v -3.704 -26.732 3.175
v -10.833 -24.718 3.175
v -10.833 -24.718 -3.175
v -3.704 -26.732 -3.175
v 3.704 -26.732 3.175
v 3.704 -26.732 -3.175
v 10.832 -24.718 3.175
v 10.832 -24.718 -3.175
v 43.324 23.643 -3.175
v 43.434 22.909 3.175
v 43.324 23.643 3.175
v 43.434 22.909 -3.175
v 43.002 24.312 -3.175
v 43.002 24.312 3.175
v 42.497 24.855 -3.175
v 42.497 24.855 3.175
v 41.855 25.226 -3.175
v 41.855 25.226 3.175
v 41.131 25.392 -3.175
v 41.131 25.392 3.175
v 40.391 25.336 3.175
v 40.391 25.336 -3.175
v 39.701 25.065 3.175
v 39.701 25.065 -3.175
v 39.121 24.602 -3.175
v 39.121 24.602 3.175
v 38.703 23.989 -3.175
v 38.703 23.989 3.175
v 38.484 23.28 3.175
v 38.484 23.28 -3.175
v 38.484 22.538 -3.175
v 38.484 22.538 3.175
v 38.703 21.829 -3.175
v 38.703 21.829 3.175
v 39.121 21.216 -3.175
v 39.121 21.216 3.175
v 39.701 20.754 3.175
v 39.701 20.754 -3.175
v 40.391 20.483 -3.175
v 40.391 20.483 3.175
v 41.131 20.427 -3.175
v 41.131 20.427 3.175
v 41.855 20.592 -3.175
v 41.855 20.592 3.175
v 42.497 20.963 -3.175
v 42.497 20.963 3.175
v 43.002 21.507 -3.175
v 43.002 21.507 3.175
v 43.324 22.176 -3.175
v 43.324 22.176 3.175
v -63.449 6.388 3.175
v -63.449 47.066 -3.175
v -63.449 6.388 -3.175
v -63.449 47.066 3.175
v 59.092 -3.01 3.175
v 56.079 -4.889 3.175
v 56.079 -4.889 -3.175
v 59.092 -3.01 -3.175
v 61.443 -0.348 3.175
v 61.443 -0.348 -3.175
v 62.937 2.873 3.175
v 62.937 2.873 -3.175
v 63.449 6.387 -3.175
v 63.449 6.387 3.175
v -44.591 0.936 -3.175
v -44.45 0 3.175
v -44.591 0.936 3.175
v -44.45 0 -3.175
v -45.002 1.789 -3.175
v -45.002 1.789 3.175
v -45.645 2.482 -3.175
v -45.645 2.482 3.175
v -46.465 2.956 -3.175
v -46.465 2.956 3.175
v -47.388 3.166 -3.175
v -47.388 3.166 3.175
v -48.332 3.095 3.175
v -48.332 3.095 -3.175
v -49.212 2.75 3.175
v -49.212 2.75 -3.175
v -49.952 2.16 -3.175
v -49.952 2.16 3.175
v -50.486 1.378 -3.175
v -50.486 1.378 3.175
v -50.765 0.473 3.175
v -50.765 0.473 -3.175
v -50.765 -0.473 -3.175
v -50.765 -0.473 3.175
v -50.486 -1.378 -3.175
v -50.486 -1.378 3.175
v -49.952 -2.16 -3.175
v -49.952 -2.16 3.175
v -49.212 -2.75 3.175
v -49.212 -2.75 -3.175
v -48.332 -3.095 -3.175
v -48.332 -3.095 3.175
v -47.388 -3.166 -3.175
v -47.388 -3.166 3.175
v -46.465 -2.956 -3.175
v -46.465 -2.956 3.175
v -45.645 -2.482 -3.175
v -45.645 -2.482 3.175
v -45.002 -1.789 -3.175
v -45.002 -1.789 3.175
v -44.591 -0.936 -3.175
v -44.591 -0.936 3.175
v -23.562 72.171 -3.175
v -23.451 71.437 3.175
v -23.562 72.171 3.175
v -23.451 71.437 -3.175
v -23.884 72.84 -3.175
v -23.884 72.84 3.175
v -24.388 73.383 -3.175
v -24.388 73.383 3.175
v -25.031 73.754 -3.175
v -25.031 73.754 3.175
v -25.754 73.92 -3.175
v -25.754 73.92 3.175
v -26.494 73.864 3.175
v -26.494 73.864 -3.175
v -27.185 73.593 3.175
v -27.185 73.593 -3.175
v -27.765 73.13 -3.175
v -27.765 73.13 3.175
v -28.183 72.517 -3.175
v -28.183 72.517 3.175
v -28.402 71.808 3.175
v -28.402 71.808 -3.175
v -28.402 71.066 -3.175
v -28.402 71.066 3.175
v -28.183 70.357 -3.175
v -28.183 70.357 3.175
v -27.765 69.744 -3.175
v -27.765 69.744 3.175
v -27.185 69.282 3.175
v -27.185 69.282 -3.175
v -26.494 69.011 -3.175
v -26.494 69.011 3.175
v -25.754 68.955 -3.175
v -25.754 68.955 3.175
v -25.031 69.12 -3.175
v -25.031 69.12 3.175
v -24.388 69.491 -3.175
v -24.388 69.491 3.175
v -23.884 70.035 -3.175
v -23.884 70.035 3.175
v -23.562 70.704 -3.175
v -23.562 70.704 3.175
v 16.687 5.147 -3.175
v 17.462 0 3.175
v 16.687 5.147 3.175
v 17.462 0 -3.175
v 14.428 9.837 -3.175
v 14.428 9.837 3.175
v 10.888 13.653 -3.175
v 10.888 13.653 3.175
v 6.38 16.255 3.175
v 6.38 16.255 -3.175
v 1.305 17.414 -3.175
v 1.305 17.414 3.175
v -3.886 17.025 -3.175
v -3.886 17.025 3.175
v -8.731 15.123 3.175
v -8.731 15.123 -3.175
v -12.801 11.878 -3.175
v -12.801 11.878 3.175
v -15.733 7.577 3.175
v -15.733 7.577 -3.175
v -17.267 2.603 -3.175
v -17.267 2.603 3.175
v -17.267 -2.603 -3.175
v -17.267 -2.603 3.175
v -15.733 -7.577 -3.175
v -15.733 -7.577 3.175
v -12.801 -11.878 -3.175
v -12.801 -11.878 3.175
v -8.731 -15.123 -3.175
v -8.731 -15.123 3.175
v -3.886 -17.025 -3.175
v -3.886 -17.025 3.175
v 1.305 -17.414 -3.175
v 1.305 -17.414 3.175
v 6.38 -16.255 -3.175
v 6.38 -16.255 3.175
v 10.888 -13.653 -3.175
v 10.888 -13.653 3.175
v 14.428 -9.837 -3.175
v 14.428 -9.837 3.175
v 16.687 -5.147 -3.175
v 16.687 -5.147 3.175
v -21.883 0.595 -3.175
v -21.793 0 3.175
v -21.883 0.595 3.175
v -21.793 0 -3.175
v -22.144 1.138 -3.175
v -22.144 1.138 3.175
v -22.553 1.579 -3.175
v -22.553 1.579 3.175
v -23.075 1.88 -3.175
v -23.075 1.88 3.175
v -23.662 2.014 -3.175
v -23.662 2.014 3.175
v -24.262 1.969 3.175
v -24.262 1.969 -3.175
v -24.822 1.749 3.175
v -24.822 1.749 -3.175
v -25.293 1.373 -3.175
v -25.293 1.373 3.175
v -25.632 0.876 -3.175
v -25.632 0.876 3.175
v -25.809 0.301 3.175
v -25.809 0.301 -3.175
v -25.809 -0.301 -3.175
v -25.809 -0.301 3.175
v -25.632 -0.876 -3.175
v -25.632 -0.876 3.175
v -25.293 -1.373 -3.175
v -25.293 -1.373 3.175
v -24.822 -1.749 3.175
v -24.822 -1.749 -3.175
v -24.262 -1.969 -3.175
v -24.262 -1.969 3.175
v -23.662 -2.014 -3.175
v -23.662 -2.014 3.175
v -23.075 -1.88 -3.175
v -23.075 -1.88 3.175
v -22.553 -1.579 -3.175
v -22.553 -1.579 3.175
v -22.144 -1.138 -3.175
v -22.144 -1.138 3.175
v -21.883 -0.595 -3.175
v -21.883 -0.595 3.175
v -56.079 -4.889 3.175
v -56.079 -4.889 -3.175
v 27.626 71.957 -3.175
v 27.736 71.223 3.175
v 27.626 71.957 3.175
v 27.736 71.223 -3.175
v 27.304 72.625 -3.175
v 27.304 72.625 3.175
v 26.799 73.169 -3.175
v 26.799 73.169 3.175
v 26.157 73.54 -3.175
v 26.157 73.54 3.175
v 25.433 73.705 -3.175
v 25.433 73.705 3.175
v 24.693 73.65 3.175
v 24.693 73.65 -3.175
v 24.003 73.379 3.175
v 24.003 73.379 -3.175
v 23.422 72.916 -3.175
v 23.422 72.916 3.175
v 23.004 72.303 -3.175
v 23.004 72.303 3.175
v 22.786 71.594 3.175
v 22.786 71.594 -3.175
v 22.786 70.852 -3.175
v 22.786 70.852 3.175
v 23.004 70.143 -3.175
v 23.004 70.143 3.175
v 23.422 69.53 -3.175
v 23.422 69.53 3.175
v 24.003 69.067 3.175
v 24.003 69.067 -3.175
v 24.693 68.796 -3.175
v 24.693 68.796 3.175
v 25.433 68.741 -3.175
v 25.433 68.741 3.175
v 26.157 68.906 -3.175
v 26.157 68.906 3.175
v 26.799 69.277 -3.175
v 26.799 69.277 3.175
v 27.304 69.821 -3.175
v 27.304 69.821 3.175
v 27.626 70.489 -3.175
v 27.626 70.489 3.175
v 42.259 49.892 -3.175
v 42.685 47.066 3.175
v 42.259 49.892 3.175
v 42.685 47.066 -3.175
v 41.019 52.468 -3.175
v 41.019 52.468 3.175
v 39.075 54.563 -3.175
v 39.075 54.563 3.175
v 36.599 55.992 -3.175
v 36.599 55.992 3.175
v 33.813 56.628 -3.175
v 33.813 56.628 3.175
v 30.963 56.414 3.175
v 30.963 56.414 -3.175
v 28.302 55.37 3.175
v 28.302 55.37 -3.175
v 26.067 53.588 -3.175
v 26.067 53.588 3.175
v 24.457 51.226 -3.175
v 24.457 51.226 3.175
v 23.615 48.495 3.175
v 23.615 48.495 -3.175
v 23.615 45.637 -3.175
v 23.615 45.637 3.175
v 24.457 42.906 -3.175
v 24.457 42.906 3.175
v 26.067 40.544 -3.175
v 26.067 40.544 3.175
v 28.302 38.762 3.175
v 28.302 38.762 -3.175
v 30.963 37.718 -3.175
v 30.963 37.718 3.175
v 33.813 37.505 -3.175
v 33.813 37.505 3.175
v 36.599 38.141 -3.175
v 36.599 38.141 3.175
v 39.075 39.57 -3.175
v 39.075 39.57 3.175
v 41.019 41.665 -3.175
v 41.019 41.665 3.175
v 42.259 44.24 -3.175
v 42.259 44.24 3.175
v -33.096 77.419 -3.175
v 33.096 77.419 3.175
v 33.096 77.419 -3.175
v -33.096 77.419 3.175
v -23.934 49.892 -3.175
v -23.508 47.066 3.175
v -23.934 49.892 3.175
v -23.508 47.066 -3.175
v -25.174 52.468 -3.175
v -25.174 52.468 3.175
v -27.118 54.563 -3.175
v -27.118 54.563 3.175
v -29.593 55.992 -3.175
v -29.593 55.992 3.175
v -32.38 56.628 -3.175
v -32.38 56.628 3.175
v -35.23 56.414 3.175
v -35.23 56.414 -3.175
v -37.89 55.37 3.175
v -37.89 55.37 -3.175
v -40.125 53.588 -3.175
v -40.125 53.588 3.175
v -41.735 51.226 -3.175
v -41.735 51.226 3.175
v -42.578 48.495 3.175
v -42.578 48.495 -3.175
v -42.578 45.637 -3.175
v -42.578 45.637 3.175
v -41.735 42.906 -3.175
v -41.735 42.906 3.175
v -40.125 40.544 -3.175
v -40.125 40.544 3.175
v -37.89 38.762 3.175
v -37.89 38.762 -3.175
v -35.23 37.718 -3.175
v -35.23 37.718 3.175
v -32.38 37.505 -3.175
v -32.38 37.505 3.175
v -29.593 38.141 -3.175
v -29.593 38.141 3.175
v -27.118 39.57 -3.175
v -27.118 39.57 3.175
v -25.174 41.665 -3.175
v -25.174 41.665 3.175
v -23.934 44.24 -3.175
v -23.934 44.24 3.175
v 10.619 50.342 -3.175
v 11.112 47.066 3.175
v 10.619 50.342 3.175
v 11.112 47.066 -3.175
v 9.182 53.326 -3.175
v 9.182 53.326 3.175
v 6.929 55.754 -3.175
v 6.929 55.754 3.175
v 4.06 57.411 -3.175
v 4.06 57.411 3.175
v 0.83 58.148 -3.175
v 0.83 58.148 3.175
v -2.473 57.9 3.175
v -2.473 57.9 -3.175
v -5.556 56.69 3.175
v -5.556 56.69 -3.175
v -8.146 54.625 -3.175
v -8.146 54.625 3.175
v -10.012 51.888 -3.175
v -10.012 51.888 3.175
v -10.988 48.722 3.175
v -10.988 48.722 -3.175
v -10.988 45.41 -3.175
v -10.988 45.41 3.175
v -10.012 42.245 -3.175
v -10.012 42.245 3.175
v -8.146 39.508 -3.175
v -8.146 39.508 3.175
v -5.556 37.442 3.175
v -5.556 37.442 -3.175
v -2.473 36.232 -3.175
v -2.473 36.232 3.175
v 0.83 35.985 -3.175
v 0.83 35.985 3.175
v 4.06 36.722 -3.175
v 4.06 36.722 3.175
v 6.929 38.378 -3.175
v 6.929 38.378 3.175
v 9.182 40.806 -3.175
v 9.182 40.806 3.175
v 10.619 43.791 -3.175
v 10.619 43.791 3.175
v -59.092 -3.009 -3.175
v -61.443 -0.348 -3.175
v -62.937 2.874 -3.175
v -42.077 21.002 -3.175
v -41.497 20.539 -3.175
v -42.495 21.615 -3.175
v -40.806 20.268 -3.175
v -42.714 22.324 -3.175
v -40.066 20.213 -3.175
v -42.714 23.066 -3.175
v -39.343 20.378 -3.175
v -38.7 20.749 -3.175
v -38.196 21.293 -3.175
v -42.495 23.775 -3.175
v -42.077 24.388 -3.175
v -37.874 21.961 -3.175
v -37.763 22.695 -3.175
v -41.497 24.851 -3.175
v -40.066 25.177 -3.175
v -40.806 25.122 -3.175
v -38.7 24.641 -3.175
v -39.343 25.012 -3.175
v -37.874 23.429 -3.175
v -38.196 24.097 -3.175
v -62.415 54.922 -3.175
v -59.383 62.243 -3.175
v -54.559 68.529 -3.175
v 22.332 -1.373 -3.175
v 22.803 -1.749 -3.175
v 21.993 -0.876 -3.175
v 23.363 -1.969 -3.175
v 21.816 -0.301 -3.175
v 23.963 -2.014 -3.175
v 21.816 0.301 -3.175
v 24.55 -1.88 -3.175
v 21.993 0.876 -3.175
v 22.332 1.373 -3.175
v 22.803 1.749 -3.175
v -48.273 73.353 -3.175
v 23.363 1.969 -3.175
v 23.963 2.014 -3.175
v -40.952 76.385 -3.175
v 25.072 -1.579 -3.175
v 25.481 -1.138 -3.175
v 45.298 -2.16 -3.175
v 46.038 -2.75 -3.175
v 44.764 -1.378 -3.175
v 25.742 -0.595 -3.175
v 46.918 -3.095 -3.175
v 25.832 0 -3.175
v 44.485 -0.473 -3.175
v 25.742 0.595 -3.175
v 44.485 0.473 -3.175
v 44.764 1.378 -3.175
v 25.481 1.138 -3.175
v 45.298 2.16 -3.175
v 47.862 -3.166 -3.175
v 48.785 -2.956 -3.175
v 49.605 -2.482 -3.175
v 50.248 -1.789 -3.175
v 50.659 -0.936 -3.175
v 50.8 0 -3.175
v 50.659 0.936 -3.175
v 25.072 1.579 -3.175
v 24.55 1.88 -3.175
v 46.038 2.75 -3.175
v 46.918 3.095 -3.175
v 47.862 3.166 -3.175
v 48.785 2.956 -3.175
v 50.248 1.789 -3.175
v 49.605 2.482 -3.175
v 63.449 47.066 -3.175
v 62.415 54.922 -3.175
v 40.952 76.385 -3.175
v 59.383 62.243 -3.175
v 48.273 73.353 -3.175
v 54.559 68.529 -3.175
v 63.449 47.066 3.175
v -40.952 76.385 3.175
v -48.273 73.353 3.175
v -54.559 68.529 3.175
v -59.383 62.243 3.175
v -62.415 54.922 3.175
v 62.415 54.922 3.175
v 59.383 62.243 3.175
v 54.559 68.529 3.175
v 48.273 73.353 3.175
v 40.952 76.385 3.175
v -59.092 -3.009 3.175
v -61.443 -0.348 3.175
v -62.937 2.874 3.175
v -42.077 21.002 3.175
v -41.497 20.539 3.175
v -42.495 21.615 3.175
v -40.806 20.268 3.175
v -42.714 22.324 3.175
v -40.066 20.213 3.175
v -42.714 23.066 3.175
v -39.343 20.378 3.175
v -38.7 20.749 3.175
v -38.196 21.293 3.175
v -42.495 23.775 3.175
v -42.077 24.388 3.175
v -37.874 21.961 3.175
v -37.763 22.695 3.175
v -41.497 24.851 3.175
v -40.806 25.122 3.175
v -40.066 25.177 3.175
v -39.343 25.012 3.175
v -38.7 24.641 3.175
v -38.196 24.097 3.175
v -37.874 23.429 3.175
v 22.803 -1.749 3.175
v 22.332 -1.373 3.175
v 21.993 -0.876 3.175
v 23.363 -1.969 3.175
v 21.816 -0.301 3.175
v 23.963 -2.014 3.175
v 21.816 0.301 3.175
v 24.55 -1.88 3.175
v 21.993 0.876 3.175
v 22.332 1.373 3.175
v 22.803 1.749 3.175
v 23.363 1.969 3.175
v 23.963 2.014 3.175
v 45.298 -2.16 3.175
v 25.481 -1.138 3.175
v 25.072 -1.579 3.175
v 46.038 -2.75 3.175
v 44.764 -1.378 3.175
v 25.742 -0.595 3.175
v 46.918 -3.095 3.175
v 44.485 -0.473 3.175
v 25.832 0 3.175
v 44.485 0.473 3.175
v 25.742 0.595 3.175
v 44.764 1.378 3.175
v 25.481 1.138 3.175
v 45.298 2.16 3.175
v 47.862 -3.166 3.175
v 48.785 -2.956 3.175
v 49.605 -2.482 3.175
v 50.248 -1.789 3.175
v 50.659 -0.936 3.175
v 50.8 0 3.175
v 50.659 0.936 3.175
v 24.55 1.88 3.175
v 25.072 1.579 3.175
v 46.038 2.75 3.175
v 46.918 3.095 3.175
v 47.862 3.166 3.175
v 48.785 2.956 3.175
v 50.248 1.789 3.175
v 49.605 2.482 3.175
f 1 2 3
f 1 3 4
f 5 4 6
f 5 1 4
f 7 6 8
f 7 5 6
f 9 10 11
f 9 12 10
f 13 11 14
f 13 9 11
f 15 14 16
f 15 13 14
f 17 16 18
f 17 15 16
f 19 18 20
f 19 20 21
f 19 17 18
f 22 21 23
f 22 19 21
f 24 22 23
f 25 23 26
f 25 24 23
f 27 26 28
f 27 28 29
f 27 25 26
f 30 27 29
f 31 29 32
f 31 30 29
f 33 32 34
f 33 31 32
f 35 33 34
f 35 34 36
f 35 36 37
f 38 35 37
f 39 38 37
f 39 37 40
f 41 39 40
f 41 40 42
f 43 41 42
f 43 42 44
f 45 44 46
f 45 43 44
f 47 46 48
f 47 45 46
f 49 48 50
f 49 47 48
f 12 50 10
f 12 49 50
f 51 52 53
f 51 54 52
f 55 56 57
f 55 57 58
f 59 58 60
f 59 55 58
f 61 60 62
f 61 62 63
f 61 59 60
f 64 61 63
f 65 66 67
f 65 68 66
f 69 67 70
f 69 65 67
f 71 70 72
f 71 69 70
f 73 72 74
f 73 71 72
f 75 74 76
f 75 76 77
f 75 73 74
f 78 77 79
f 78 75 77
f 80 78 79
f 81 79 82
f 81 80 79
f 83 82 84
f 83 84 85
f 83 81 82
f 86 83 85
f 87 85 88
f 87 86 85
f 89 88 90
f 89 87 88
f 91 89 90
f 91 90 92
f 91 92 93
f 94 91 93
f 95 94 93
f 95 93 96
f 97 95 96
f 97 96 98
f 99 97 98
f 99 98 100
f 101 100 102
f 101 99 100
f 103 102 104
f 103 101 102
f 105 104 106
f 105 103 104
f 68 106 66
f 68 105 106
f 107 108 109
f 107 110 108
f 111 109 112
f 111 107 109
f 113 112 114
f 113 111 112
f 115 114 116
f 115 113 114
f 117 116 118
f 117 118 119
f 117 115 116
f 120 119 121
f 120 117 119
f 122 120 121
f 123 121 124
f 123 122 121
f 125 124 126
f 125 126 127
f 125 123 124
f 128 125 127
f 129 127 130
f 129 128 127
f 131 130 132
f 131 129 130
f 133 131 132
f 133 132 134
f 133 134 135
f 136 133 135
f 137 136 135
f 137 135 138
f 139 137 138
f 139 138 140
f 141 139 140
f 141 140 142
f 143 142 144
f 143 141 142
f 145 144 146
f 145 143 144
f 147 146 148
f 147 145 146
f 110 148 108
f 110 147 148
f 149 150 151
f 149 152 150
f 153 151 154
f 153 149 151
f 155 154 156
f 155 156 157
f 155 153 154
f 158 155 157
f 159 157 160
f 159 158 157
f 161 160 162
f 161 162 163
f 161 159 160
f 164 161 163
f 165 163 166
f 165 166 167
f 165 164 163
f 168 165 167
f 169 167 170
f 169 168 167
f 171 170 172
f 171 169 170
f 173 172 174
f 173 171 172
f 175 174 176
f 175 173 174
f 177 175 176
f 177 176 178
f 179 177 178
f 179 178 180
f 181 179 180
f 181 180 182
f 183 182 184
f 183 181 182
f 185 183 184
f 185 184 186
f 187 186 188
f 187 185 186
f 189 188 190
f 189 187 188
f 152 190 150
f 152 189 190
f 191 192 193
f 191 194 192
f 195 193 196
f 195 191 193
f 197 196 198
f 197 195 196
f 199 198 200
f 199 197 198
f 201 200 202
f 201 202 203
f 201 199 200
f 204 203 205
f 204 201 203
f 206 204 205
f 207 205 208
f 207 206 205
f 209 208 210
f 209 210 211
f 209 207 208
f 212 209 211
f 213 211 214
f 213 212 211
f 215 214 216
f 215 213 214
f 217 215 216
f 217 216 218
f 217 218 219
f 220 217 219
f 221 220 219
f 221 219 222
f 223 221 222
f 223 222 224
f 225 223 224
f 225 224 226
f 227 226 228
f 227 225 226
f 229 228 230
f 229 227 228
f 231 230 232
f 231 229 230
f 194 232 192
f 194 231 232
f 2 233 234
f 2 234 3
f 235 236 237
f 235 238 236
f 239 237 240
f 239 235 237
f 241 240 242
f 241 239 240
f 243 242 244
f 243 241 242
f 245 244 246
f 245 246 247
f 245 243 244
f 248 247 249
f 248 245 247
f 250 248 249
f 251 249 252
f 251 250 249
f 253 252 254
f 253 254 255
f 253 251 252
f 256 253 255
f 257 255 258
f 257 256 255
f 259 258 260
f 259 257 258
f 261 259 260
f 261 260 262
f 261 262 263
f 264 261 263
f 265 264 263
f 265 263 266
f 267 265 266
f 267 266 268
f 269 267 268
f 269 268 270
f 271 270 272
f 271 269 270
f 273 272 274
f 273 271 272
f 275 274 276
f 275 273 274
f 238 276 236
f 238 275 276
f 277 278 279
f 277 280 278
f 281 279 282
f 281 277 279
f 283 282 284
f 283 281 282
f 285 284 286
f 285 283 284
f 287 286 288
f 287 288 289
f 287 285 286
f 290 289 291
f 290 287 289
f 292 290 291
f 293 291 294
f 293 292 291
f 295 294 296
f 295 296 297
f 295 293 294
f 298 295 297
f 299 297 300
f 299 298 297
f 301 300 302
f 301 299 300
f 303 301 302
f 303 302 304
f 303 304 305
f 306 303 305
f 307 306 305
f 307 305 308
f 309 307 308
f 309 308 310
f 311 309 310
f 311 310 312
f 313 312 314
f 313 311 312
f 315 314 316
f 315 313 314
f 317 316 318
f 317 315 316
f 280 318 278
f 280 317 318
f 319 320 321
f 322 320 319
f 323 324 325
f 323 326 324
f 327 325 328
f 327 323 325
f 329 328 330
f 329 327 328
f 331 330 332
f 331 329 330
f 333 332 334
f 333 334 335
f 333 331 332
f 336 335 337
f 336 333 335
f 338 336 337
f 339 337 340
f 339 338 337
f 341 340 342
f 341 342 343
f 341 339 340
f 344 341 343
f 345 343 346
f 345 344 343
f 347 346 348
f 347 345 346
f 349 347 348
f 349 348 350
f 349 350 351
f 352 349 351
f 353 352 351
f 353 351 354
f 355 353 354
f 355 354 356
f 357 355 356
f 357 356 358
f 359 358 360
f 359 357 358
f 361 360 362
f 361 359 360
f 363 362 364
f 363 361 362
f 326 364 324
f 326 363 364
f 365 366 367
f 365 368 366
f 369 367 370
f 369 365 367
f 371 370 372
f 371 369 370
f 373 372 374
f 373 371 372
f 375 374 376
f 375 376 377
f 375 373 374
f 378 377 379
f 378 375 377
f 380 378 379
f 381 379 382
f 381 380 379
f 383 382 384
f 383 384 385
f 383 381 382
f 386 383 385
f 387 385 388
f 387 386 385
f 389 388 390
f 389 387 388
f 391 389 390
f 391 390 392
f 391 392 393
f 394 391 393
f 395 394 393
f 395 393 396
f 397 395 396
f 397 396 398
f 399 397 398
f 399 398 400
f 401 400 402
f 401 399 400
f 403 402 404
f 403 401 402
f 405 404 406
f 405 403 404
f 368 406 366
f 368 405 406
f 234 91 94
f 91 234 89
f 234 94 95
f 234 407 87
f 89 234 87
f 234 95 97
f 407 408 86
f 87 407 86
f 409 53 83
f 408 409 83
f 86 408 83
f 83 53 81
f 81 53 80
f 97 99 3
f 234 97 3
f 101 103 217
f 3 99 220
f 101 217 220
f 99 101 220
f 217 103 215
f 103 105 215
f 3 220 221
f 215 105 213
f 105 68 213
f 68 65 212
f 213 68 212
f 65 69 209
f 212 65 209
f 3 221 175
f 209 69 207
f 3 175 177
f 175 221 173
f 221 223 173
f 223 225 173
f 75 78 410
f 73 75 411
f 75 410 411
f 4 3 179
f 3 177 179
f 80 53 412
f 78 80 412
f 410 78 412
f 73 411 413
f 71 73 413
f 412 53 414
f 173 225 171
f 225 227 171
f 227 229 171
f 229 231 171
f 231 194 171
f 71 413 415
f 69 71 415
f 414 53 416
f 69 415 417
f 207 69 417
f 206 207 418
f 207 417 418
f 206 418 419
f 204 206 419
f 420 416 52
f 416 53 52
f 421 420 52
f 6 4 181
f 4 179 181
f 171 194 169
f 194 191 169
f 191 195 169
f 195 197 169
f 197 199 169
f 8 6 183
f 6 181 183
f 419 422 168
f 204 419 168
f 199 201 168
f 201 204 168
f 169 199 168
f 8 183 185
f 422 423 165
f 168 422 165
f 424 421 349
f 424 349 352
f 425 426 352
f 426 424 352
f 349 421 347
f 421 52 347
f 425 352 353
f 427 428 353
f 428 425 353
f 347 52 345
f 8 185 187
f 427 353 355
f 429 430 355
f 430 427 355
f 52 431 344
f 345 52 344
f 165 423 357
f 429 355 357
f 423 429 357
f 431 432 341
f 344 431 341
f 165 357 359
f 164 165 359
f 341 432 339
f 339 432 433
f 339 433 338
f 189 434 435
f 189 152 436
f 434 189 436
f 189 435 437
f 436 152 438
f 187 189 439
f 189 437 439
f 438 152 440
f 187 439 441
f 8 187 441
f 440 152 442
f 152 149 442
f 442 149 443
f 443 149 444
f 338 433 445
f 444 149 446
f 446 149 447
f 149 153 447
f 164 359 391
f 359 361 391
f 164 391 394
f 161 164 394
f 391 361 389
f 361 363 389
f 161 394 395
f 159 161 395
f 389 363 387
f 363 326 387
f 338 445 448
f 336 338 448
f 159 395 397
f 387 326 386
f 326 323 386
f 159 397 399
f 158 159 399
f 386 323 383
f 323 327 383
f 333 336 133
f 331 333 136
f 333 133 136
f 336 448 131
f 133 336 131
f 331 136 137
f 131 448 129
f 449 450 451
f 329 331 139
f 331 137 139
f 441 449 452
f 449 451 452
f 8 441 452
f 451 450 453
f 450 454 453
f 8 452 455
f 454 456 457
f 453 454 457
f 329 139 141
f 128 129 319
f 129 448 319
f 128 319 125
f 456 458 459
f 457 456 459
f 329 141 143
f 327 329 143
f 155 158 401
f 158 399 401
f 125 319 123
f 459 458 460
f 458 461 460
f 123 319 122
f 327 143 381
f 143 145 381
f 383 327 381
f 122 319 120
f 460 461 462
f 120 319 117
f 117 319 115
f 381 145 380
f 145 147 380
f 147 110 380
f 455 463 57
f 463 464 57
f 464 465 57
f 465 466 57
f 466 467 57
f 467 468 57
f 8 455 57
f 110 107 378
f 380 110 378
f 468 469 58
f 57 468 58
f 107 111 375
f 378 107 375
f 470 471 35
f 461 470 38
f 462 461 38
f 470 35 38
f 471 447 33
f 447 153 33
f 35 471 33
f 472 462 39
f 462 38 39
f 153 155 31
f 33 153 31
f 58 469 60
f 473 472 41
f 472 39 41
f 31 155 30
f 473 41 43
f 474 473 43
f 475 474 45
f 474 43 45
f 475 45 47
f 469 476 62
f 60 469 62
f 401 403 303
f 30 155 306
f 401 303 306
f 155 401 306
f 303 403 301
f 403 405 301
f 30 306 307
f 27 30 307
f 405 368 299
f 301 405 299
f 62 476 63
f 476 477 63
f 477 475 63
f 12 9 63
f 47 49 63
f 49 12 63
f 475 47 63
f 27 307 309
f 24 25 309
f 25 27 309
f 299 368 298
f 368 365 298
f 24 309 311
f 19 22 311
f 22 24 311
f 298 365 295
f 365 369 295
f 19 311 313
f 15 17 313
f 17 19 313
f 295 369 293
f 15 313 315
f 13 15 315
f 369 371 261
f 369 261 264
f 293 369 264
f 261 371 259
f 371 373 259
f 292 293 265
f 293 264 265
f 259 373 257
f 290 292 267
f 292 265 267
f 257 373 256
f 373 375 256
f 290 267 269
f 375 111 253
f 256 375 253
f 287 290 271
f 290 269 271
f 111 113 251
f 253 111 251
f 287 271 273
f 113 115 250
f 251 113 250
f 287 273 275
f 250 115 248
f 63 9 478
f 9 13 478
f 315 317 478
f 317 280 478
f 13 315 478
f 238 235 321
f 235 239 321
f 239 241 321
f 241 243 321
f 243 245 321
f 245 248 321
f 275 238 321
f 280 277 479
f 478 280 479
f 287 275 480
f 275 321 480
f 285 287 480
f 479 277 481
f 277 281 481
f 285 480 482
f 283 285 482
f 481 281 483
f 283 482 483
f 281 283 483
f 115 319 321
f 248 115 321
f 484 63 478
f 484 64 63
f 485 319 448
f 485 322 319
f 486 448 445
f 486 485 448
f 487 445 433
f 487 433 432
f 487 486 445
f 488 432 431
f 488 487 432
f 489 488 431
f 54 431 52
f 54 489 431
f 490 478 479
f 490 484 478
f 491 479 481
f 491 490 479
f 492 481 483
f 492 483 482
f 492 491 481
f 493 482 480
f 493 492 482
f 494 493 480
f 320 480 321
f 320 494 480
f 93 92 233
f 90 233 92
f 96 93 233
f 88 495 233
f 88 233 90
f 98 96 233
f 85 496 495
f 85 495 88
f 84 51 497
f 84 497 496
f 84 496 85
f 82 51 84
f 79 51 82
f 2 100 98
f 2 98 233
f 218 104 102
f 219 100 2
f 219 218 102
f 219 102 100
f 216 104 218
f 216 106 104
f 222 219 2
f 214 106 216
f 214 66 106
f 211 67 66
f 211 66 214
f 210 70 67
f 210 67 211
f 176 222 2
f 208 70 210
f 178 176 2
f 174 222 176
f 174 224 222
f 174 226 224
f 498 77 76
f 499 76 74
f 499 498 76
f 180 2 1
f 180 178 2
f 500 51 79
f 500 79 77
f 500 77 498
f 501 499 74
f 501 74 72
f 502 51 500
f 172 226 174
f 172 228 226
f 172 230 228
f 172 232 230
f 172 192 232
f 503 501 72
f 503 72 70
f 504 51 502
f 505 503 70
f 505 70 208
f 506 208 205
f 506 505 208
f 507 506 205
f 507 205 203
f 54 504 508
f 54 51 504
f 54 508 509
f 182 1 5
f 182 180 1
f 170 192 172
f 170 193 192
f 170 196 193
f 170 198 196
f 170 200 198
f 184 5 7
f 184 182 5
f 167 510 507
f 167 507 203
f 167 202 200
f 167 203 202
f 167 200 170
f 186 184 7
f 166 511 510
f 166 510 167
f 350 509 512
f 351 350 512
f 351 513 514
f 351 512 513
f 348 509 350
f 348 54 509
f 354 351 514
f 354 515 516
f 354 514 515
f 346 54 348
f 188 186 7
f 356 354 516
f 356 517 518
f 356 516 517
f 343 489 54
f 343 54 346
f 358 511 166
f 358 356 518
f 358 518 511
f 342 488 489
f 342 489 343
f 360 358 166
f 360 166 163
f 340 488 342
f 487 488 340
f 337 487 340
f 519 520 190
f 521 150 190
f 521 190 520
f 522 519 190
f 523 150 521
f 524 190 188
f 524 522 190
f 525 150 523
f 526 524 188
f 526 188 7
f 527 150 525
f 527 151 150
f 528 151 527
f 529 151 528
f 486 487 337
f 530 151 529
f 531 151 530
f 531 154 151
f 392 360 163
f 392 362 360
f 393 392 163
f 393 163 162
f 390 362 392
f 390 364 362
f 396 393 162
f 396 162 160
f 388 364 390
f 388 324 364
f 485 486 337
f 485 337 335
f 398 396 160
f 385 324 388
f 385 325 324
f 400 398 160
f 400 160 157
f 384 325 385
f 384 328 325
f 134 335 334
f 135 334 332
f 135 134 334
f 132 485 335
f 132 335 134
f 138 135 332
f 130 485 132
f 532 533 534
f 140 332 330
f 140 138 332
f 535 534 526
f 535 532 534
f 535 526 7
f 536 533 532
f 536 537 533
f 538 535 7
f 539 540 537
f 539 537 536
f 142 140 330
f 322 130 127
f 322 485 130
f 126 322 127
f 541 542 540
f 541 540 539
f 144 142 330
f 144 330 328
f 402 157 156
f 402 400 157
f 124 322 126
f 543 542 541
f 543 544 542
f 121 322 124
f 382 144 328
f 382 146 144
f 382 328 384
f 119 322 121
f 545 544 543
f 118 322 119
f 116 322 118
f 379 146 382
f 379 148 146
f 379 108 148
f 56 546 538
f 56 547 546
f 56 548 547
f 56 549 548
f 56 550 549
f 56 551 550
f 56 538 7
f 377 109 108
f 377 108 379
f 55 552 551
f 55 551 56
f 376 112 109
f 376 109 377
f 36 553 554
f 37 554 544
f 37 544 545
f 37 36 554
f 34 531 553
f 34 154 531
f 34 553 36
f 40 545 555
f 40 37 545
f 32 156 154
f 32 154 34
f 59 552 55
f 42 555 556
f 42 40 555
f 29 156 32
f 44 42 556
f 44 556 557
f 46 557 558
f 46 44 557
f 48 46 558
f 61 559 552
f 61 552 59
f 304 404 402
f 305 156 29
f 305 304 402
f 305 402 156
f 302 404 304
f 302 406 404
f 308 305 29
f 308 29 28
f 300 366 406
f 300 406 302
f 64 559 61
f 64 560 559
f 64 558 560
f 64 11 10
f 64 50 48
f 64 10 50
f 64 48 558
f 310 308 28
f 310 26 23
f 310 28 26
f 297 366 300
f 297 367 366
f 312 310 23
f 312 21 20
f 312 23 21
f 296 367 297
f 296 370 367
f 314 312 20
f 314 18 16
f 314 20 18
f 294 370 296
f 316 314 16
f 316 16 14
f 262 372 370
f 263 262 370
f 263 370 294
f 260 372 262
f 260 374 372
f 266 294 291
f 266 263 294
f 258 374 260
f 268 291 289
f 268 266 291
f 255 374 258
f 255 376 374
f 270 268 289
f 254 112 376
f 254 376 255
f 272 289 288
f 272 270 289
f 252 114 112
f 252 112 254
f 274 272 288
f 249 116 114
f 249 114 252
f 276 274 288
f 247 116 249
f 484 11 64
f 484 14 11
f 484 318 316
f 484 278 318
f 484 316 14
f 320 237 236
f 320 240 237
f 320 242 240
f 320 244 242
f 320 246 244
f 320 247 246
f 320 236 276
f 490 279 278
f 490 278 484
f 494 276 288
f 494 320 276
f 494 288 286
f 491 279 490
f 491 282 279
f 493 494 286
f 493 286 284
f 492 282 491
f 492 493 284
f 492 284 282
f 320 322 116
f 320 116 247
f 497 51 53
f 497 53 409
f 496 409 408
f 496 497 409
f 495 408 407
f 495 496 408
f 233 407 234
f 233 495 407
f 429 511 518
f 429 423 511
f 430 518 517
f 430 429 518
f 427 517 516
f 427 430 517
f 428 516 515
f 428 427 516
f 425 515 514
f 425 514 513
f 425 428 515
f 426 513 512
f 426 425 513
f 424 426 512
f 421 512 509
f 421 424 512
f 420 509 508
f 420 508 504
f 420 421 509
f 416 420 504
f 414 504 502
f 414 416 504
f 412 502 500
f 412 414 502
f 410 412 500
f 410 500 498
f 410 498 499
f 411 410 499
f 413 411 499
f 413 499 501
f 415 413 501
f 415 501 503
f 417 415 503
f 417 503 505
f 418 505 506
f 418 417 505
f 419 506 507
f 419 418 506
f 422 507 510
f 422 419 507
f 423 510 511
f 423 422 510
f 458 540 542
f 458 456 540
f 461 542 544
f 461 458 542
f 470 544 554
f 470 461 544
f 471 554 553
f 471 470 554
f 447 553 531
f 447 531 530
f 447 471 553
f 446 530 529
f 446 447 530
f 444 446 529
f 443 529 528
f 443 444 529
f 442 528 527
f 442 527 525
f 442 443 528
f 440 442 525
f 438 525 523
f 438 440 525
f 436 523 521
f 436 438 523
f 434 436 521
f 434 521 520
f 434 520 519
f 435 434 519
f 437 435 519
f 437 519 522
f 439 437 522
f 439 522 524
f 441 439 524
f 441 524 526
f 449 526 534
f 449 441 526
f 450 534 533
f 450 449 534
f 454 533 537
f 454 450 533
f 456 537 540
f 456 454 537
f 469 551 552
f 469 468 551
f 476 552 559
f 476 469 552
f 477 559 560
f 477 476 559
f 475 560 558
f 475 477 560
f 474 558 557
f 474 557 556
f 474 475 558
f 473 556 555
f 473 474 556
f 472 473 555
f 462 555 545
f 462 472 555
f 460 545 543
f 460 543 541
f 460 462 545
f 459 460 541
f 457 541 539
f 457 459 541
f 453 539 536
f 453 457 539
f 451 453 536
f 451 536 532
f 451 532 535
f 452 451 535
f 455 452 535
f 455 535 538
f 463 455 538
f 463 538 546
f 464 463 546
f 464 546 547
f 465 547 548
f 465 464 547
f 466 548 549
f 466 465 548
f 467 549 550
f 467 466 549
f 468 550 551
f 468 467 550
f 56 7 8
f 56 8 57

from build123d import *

# Parameters (mm, degrees)
SKETCH1_R           = 17.4625
SKETCH1_R_2         = 3.175
SKETCH1_R_3         = 2.0193
SKETCH1_R_4         = 11.1125
SKETCH1_R_5         = 9.5885
SKETCH1_R_6         = 2.4892
BOSS_EXTRUDE1_DEPTH = 3.175


with BuildPart() as part:
    # Sketch1 → Boss-Extrude1 (new, symmetric)
    with BuildSketch(Plane.XY):
        with BuildLine():
            Line((-63.4492, 47.0662), (-63.4492, 6.387701907))
            ThreePointArc((-63.4492, 6.387701907), (-61.443306044, -0.347944705), (-56.079239896, -4.888797072))
            Line((-56.079239896, -4.888797072), (-10.832597323, -24.718009456))
            ThreePointArc((-10.832597323, -24.718009456), (-5.8974e-05, -26.9875), (10.832489293, -24.7180568))
            Line((10.832489293, -24.7180568), (56.079190612, -4.8890544))
            ThreePointArc((56.079190612, -4.8890544), (61.443291325, -0.348202956), (63.4492, 6.387466177))
            Line((63.4492, 6.387466177), (63.4492, 47.0662))
            ThreePointArc((63.4492, 47.0662), (54.559012129, 68.529012129), (33.0962, 77.4192))
            Line((33.0962, 77.4192), (-33.0962, 77.4192))
            ThreePointArc((-33.0962, 77.4192), (-54.559012129, 68.529012129), (-63.4492, 47.0662))
        make_face()
        Circle(SKETCH1_R, mode=Mode.SUBTRACT)
        with Locations((47.625, 0)):
            Circle(SKETCH1_R_2, mode=Mode.SUBTRACT)
        with Locations((-23.8125, 0)):
            Circle(SKETCH1_R_3, mode=Mode.SUBTRACT)
        with Locations((-47.625, 0)):
            Circle(SKETCH1_R_2, mode=Mode.SUBTRACT)
        with Locations((23.8125, 0)):
            Circle(SKETCH1_R_3, mode=Mode.SUBTRACT)
        with Locations((0, 47.0662)):
            Circle(SKETCH1_R_4, mode=Mode.SUBTRACT)
        with Locations((33.0962, 47.0662)):
            Circle(SKETCH1_R_5, mode=Mode.SUBTRACT)
        with Locations((-33.0962, 47.0662)):
            Circle(SKETCH1_R_5, mode=Mode.SUBTRACT)
        with Locations((-25.940193056, 71.43732153)):
            Circle(SKETCH1_R_6, mode=Mode.SUBTRACT)
        with Locations((-40.252206944, 22.69507847)):
            Circle(SKETCH1_R_6, mode=Mode.SUBTRACT)
        with Locations((40.945231657, 22.909364486)):
            Circle(SKETCH1_R_6, mode=Mode.SUBTRACT)
        with Locations((25.247168343, 71.223035514)):
            Circle(SKETCH1_R_6, mode=Mode.SUBTRACT)
    extrude(amount=BOSS_EXTRUDE1_DEPTH, both=True)


solid = part.part
